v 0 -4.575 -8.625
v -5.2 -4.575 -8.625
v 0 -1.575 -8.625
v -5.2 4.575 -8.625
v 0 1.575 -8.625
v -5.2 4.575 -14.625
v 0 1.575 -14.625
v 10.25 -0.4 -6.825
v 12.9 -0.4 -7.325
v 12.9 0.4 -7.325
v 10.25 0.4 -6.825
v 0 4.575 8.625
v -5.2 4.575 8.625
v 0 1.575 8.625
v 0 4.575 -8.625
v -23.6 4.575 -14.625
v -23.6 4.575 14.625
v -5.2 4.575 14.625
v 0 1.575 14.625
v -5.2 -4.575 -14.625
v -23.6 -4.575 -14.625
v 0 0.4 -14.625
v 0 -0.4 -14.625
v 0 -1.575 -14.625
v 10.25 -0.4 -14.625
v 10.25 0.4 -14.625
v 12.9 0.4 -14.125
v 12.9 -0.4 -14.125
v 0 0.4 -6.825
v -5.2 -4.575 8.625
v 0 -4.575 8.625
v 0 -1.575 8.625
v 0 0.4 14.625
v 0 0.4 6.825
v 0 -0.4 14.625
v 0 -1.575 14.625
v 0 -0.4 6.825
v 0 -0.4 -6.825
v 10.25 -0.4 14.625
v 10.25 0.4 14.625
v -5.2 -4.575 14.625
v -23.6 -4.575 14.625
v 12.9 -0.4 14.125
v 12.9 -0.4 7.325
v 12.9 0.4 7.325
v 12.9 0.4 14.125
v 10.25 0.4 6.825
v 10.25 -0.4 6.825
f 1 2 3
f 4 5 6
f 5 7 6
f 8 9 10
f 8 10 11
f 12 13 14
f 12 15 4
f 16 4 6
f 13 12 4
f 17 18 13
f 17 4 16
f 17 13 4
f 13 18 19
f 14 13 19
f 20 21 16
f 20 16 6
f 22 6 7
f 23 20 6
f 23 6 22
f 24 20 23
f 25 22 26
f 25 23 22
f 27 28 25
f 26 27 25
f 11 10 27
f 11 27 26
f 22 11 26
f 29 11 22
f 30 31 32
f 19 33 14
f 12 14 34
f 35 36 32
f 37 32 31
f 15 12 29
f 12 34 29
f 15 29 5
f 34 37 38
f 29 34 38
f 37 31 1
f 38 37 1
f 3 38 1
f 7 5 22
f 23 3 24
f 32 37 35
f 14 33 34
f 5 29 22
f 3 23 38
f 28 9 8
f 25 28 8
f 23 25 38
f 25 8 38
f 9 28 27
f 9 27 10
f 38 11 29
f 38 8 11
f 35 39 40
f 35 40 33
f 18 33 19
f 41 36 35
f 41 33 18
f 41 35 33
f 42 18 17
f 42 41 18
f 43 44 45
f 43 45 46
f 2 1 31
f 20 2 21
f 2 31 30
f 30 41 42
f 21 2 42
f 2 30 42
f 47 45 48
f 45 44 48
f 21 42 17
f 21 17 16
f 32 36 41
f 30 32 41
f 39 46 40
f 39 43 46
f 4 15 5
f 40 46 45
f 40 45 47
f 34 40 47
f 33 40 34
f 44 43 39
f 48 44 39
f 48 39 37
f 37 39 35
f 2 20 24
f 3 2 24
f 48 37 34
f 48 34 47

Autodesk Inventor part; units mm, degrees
ref_plane "YZ Plane" through (0, 0, 0) normal (1, 0, 0) x (0, 1, 0)
ref_plane "XZ Plane" through (0, 0, 0) normal (0, 1, 0) x (-1, 0, 0)
ref_plane "XY Plane" through (0, 0, 0) normal (0, 0, 1) x (1, 0, 0)
sketch "Sketch1" plane through (0, 0, 0) normal (0, 1, 0) x (-1, 0, 0)
  line L0 (23.6, 14.625) -> (23.6, -14.625)
  line L1 (23.6, -14.625) -> (-10.25, -14.625)
  line L2 (-12.9, -14.125) -> (-12.9, -7.325)
  line L3 (-10.25, -6.825) -> (0, -6.825)
  line L4 (0, -6.825) -> (0, 6.825)
  line L5 (0, 6.825) -> (-10.25, 6.825)
  line L6 (-12.9, 7.325) -> (-12.9, 14.125)
  line L7 (-10.25, 14.625) -> (23.6, 14.625)
  line L8 (30.9, 0) -> (-20.2, 0) projected
  line L9 (-12.9, 14.125) -> (-10.25, 14.625)
  line L10 (-12.9, 7.325) -> (-10.25, 6.825)
  line L11 (-12.9, -7.325) -> (-10.25, -6.825)
  line L12 (-12.9, -14.125) -> (-10.25, -14.625)
  point P0 (-12.9, 6.825)
  point P1 (-12.9, 14.625)
  dimension "d0" = 29.25
  dimension "d1" = 23.6
  dimension "d2" = 7.8
  dimension "d3" = 12.9
  dimension "d14" = 6.825
  dimension "d15" = 13.65
  dimension "d16" = 6.8
  dimension "d17" = 6.8
  dimension "d18" = 2.65
  dimension "d19" = 2.65
  dimension "d20" = 2.65
  dimension "d21" = 2.65
  dimension "d22" = 0.5
  dimension "d23" = 0.5
extrude "Extrusion1" add sketch "Sketch1" along normal mid plane 0.8
sketch "Sketch2" plane through (0, 0, 0) normal (0, 1, 0) x (-1, 0, 0)
  line L0 (23.6, -14.625) -> (23.6, 14.625) projected
  line L1 (23.6, 14.625) -> (-10.25, 14.625) projected
  line L2 (0, 0) -> (0, -6.825) projected
  line L3 (0, 0) -> (0, 14.625)
  line L4 (0, -6.825) -> (0, -14.625)
  line L5 (-10.25, -14.625) -> (23.6, -14.625) projected
  point P0 (-12.9, 14.625)
extrude "Extrusion2" add sketch "Sketch2" along normal mid plane 9.15
sketch "Sketch3" plane through (0, -0.4, 14.625) normal (0, 0, 1) x (1, 0, 0)
  line L0 (-23.6, 4.975) -> (0, 4.975) projected
  line L1 (0, 0.8) -> (0, 4.975) projected
  line L2 (-5.2, 4.975) -> (0, 1.975)
  point P0 (0, 0.4)
  dimension "d10" = 5.2
  dimension "d11" = 3
extrude "Extrusion3" cut sketch "Sketch3" against normal blind 6
mirror "Mirror1" about plane through (0, 0, 0) normal (0, 0, 1) of "Extrusion3"
mirror "Mirror2" about plane through (0, 0, 0) normal (0, 1, 0) of "Extrusion3", "Mirror1"
equation "\"d14\" = 0.5 * d15"
properties part number "C0-1-01-circuitBreaker"
